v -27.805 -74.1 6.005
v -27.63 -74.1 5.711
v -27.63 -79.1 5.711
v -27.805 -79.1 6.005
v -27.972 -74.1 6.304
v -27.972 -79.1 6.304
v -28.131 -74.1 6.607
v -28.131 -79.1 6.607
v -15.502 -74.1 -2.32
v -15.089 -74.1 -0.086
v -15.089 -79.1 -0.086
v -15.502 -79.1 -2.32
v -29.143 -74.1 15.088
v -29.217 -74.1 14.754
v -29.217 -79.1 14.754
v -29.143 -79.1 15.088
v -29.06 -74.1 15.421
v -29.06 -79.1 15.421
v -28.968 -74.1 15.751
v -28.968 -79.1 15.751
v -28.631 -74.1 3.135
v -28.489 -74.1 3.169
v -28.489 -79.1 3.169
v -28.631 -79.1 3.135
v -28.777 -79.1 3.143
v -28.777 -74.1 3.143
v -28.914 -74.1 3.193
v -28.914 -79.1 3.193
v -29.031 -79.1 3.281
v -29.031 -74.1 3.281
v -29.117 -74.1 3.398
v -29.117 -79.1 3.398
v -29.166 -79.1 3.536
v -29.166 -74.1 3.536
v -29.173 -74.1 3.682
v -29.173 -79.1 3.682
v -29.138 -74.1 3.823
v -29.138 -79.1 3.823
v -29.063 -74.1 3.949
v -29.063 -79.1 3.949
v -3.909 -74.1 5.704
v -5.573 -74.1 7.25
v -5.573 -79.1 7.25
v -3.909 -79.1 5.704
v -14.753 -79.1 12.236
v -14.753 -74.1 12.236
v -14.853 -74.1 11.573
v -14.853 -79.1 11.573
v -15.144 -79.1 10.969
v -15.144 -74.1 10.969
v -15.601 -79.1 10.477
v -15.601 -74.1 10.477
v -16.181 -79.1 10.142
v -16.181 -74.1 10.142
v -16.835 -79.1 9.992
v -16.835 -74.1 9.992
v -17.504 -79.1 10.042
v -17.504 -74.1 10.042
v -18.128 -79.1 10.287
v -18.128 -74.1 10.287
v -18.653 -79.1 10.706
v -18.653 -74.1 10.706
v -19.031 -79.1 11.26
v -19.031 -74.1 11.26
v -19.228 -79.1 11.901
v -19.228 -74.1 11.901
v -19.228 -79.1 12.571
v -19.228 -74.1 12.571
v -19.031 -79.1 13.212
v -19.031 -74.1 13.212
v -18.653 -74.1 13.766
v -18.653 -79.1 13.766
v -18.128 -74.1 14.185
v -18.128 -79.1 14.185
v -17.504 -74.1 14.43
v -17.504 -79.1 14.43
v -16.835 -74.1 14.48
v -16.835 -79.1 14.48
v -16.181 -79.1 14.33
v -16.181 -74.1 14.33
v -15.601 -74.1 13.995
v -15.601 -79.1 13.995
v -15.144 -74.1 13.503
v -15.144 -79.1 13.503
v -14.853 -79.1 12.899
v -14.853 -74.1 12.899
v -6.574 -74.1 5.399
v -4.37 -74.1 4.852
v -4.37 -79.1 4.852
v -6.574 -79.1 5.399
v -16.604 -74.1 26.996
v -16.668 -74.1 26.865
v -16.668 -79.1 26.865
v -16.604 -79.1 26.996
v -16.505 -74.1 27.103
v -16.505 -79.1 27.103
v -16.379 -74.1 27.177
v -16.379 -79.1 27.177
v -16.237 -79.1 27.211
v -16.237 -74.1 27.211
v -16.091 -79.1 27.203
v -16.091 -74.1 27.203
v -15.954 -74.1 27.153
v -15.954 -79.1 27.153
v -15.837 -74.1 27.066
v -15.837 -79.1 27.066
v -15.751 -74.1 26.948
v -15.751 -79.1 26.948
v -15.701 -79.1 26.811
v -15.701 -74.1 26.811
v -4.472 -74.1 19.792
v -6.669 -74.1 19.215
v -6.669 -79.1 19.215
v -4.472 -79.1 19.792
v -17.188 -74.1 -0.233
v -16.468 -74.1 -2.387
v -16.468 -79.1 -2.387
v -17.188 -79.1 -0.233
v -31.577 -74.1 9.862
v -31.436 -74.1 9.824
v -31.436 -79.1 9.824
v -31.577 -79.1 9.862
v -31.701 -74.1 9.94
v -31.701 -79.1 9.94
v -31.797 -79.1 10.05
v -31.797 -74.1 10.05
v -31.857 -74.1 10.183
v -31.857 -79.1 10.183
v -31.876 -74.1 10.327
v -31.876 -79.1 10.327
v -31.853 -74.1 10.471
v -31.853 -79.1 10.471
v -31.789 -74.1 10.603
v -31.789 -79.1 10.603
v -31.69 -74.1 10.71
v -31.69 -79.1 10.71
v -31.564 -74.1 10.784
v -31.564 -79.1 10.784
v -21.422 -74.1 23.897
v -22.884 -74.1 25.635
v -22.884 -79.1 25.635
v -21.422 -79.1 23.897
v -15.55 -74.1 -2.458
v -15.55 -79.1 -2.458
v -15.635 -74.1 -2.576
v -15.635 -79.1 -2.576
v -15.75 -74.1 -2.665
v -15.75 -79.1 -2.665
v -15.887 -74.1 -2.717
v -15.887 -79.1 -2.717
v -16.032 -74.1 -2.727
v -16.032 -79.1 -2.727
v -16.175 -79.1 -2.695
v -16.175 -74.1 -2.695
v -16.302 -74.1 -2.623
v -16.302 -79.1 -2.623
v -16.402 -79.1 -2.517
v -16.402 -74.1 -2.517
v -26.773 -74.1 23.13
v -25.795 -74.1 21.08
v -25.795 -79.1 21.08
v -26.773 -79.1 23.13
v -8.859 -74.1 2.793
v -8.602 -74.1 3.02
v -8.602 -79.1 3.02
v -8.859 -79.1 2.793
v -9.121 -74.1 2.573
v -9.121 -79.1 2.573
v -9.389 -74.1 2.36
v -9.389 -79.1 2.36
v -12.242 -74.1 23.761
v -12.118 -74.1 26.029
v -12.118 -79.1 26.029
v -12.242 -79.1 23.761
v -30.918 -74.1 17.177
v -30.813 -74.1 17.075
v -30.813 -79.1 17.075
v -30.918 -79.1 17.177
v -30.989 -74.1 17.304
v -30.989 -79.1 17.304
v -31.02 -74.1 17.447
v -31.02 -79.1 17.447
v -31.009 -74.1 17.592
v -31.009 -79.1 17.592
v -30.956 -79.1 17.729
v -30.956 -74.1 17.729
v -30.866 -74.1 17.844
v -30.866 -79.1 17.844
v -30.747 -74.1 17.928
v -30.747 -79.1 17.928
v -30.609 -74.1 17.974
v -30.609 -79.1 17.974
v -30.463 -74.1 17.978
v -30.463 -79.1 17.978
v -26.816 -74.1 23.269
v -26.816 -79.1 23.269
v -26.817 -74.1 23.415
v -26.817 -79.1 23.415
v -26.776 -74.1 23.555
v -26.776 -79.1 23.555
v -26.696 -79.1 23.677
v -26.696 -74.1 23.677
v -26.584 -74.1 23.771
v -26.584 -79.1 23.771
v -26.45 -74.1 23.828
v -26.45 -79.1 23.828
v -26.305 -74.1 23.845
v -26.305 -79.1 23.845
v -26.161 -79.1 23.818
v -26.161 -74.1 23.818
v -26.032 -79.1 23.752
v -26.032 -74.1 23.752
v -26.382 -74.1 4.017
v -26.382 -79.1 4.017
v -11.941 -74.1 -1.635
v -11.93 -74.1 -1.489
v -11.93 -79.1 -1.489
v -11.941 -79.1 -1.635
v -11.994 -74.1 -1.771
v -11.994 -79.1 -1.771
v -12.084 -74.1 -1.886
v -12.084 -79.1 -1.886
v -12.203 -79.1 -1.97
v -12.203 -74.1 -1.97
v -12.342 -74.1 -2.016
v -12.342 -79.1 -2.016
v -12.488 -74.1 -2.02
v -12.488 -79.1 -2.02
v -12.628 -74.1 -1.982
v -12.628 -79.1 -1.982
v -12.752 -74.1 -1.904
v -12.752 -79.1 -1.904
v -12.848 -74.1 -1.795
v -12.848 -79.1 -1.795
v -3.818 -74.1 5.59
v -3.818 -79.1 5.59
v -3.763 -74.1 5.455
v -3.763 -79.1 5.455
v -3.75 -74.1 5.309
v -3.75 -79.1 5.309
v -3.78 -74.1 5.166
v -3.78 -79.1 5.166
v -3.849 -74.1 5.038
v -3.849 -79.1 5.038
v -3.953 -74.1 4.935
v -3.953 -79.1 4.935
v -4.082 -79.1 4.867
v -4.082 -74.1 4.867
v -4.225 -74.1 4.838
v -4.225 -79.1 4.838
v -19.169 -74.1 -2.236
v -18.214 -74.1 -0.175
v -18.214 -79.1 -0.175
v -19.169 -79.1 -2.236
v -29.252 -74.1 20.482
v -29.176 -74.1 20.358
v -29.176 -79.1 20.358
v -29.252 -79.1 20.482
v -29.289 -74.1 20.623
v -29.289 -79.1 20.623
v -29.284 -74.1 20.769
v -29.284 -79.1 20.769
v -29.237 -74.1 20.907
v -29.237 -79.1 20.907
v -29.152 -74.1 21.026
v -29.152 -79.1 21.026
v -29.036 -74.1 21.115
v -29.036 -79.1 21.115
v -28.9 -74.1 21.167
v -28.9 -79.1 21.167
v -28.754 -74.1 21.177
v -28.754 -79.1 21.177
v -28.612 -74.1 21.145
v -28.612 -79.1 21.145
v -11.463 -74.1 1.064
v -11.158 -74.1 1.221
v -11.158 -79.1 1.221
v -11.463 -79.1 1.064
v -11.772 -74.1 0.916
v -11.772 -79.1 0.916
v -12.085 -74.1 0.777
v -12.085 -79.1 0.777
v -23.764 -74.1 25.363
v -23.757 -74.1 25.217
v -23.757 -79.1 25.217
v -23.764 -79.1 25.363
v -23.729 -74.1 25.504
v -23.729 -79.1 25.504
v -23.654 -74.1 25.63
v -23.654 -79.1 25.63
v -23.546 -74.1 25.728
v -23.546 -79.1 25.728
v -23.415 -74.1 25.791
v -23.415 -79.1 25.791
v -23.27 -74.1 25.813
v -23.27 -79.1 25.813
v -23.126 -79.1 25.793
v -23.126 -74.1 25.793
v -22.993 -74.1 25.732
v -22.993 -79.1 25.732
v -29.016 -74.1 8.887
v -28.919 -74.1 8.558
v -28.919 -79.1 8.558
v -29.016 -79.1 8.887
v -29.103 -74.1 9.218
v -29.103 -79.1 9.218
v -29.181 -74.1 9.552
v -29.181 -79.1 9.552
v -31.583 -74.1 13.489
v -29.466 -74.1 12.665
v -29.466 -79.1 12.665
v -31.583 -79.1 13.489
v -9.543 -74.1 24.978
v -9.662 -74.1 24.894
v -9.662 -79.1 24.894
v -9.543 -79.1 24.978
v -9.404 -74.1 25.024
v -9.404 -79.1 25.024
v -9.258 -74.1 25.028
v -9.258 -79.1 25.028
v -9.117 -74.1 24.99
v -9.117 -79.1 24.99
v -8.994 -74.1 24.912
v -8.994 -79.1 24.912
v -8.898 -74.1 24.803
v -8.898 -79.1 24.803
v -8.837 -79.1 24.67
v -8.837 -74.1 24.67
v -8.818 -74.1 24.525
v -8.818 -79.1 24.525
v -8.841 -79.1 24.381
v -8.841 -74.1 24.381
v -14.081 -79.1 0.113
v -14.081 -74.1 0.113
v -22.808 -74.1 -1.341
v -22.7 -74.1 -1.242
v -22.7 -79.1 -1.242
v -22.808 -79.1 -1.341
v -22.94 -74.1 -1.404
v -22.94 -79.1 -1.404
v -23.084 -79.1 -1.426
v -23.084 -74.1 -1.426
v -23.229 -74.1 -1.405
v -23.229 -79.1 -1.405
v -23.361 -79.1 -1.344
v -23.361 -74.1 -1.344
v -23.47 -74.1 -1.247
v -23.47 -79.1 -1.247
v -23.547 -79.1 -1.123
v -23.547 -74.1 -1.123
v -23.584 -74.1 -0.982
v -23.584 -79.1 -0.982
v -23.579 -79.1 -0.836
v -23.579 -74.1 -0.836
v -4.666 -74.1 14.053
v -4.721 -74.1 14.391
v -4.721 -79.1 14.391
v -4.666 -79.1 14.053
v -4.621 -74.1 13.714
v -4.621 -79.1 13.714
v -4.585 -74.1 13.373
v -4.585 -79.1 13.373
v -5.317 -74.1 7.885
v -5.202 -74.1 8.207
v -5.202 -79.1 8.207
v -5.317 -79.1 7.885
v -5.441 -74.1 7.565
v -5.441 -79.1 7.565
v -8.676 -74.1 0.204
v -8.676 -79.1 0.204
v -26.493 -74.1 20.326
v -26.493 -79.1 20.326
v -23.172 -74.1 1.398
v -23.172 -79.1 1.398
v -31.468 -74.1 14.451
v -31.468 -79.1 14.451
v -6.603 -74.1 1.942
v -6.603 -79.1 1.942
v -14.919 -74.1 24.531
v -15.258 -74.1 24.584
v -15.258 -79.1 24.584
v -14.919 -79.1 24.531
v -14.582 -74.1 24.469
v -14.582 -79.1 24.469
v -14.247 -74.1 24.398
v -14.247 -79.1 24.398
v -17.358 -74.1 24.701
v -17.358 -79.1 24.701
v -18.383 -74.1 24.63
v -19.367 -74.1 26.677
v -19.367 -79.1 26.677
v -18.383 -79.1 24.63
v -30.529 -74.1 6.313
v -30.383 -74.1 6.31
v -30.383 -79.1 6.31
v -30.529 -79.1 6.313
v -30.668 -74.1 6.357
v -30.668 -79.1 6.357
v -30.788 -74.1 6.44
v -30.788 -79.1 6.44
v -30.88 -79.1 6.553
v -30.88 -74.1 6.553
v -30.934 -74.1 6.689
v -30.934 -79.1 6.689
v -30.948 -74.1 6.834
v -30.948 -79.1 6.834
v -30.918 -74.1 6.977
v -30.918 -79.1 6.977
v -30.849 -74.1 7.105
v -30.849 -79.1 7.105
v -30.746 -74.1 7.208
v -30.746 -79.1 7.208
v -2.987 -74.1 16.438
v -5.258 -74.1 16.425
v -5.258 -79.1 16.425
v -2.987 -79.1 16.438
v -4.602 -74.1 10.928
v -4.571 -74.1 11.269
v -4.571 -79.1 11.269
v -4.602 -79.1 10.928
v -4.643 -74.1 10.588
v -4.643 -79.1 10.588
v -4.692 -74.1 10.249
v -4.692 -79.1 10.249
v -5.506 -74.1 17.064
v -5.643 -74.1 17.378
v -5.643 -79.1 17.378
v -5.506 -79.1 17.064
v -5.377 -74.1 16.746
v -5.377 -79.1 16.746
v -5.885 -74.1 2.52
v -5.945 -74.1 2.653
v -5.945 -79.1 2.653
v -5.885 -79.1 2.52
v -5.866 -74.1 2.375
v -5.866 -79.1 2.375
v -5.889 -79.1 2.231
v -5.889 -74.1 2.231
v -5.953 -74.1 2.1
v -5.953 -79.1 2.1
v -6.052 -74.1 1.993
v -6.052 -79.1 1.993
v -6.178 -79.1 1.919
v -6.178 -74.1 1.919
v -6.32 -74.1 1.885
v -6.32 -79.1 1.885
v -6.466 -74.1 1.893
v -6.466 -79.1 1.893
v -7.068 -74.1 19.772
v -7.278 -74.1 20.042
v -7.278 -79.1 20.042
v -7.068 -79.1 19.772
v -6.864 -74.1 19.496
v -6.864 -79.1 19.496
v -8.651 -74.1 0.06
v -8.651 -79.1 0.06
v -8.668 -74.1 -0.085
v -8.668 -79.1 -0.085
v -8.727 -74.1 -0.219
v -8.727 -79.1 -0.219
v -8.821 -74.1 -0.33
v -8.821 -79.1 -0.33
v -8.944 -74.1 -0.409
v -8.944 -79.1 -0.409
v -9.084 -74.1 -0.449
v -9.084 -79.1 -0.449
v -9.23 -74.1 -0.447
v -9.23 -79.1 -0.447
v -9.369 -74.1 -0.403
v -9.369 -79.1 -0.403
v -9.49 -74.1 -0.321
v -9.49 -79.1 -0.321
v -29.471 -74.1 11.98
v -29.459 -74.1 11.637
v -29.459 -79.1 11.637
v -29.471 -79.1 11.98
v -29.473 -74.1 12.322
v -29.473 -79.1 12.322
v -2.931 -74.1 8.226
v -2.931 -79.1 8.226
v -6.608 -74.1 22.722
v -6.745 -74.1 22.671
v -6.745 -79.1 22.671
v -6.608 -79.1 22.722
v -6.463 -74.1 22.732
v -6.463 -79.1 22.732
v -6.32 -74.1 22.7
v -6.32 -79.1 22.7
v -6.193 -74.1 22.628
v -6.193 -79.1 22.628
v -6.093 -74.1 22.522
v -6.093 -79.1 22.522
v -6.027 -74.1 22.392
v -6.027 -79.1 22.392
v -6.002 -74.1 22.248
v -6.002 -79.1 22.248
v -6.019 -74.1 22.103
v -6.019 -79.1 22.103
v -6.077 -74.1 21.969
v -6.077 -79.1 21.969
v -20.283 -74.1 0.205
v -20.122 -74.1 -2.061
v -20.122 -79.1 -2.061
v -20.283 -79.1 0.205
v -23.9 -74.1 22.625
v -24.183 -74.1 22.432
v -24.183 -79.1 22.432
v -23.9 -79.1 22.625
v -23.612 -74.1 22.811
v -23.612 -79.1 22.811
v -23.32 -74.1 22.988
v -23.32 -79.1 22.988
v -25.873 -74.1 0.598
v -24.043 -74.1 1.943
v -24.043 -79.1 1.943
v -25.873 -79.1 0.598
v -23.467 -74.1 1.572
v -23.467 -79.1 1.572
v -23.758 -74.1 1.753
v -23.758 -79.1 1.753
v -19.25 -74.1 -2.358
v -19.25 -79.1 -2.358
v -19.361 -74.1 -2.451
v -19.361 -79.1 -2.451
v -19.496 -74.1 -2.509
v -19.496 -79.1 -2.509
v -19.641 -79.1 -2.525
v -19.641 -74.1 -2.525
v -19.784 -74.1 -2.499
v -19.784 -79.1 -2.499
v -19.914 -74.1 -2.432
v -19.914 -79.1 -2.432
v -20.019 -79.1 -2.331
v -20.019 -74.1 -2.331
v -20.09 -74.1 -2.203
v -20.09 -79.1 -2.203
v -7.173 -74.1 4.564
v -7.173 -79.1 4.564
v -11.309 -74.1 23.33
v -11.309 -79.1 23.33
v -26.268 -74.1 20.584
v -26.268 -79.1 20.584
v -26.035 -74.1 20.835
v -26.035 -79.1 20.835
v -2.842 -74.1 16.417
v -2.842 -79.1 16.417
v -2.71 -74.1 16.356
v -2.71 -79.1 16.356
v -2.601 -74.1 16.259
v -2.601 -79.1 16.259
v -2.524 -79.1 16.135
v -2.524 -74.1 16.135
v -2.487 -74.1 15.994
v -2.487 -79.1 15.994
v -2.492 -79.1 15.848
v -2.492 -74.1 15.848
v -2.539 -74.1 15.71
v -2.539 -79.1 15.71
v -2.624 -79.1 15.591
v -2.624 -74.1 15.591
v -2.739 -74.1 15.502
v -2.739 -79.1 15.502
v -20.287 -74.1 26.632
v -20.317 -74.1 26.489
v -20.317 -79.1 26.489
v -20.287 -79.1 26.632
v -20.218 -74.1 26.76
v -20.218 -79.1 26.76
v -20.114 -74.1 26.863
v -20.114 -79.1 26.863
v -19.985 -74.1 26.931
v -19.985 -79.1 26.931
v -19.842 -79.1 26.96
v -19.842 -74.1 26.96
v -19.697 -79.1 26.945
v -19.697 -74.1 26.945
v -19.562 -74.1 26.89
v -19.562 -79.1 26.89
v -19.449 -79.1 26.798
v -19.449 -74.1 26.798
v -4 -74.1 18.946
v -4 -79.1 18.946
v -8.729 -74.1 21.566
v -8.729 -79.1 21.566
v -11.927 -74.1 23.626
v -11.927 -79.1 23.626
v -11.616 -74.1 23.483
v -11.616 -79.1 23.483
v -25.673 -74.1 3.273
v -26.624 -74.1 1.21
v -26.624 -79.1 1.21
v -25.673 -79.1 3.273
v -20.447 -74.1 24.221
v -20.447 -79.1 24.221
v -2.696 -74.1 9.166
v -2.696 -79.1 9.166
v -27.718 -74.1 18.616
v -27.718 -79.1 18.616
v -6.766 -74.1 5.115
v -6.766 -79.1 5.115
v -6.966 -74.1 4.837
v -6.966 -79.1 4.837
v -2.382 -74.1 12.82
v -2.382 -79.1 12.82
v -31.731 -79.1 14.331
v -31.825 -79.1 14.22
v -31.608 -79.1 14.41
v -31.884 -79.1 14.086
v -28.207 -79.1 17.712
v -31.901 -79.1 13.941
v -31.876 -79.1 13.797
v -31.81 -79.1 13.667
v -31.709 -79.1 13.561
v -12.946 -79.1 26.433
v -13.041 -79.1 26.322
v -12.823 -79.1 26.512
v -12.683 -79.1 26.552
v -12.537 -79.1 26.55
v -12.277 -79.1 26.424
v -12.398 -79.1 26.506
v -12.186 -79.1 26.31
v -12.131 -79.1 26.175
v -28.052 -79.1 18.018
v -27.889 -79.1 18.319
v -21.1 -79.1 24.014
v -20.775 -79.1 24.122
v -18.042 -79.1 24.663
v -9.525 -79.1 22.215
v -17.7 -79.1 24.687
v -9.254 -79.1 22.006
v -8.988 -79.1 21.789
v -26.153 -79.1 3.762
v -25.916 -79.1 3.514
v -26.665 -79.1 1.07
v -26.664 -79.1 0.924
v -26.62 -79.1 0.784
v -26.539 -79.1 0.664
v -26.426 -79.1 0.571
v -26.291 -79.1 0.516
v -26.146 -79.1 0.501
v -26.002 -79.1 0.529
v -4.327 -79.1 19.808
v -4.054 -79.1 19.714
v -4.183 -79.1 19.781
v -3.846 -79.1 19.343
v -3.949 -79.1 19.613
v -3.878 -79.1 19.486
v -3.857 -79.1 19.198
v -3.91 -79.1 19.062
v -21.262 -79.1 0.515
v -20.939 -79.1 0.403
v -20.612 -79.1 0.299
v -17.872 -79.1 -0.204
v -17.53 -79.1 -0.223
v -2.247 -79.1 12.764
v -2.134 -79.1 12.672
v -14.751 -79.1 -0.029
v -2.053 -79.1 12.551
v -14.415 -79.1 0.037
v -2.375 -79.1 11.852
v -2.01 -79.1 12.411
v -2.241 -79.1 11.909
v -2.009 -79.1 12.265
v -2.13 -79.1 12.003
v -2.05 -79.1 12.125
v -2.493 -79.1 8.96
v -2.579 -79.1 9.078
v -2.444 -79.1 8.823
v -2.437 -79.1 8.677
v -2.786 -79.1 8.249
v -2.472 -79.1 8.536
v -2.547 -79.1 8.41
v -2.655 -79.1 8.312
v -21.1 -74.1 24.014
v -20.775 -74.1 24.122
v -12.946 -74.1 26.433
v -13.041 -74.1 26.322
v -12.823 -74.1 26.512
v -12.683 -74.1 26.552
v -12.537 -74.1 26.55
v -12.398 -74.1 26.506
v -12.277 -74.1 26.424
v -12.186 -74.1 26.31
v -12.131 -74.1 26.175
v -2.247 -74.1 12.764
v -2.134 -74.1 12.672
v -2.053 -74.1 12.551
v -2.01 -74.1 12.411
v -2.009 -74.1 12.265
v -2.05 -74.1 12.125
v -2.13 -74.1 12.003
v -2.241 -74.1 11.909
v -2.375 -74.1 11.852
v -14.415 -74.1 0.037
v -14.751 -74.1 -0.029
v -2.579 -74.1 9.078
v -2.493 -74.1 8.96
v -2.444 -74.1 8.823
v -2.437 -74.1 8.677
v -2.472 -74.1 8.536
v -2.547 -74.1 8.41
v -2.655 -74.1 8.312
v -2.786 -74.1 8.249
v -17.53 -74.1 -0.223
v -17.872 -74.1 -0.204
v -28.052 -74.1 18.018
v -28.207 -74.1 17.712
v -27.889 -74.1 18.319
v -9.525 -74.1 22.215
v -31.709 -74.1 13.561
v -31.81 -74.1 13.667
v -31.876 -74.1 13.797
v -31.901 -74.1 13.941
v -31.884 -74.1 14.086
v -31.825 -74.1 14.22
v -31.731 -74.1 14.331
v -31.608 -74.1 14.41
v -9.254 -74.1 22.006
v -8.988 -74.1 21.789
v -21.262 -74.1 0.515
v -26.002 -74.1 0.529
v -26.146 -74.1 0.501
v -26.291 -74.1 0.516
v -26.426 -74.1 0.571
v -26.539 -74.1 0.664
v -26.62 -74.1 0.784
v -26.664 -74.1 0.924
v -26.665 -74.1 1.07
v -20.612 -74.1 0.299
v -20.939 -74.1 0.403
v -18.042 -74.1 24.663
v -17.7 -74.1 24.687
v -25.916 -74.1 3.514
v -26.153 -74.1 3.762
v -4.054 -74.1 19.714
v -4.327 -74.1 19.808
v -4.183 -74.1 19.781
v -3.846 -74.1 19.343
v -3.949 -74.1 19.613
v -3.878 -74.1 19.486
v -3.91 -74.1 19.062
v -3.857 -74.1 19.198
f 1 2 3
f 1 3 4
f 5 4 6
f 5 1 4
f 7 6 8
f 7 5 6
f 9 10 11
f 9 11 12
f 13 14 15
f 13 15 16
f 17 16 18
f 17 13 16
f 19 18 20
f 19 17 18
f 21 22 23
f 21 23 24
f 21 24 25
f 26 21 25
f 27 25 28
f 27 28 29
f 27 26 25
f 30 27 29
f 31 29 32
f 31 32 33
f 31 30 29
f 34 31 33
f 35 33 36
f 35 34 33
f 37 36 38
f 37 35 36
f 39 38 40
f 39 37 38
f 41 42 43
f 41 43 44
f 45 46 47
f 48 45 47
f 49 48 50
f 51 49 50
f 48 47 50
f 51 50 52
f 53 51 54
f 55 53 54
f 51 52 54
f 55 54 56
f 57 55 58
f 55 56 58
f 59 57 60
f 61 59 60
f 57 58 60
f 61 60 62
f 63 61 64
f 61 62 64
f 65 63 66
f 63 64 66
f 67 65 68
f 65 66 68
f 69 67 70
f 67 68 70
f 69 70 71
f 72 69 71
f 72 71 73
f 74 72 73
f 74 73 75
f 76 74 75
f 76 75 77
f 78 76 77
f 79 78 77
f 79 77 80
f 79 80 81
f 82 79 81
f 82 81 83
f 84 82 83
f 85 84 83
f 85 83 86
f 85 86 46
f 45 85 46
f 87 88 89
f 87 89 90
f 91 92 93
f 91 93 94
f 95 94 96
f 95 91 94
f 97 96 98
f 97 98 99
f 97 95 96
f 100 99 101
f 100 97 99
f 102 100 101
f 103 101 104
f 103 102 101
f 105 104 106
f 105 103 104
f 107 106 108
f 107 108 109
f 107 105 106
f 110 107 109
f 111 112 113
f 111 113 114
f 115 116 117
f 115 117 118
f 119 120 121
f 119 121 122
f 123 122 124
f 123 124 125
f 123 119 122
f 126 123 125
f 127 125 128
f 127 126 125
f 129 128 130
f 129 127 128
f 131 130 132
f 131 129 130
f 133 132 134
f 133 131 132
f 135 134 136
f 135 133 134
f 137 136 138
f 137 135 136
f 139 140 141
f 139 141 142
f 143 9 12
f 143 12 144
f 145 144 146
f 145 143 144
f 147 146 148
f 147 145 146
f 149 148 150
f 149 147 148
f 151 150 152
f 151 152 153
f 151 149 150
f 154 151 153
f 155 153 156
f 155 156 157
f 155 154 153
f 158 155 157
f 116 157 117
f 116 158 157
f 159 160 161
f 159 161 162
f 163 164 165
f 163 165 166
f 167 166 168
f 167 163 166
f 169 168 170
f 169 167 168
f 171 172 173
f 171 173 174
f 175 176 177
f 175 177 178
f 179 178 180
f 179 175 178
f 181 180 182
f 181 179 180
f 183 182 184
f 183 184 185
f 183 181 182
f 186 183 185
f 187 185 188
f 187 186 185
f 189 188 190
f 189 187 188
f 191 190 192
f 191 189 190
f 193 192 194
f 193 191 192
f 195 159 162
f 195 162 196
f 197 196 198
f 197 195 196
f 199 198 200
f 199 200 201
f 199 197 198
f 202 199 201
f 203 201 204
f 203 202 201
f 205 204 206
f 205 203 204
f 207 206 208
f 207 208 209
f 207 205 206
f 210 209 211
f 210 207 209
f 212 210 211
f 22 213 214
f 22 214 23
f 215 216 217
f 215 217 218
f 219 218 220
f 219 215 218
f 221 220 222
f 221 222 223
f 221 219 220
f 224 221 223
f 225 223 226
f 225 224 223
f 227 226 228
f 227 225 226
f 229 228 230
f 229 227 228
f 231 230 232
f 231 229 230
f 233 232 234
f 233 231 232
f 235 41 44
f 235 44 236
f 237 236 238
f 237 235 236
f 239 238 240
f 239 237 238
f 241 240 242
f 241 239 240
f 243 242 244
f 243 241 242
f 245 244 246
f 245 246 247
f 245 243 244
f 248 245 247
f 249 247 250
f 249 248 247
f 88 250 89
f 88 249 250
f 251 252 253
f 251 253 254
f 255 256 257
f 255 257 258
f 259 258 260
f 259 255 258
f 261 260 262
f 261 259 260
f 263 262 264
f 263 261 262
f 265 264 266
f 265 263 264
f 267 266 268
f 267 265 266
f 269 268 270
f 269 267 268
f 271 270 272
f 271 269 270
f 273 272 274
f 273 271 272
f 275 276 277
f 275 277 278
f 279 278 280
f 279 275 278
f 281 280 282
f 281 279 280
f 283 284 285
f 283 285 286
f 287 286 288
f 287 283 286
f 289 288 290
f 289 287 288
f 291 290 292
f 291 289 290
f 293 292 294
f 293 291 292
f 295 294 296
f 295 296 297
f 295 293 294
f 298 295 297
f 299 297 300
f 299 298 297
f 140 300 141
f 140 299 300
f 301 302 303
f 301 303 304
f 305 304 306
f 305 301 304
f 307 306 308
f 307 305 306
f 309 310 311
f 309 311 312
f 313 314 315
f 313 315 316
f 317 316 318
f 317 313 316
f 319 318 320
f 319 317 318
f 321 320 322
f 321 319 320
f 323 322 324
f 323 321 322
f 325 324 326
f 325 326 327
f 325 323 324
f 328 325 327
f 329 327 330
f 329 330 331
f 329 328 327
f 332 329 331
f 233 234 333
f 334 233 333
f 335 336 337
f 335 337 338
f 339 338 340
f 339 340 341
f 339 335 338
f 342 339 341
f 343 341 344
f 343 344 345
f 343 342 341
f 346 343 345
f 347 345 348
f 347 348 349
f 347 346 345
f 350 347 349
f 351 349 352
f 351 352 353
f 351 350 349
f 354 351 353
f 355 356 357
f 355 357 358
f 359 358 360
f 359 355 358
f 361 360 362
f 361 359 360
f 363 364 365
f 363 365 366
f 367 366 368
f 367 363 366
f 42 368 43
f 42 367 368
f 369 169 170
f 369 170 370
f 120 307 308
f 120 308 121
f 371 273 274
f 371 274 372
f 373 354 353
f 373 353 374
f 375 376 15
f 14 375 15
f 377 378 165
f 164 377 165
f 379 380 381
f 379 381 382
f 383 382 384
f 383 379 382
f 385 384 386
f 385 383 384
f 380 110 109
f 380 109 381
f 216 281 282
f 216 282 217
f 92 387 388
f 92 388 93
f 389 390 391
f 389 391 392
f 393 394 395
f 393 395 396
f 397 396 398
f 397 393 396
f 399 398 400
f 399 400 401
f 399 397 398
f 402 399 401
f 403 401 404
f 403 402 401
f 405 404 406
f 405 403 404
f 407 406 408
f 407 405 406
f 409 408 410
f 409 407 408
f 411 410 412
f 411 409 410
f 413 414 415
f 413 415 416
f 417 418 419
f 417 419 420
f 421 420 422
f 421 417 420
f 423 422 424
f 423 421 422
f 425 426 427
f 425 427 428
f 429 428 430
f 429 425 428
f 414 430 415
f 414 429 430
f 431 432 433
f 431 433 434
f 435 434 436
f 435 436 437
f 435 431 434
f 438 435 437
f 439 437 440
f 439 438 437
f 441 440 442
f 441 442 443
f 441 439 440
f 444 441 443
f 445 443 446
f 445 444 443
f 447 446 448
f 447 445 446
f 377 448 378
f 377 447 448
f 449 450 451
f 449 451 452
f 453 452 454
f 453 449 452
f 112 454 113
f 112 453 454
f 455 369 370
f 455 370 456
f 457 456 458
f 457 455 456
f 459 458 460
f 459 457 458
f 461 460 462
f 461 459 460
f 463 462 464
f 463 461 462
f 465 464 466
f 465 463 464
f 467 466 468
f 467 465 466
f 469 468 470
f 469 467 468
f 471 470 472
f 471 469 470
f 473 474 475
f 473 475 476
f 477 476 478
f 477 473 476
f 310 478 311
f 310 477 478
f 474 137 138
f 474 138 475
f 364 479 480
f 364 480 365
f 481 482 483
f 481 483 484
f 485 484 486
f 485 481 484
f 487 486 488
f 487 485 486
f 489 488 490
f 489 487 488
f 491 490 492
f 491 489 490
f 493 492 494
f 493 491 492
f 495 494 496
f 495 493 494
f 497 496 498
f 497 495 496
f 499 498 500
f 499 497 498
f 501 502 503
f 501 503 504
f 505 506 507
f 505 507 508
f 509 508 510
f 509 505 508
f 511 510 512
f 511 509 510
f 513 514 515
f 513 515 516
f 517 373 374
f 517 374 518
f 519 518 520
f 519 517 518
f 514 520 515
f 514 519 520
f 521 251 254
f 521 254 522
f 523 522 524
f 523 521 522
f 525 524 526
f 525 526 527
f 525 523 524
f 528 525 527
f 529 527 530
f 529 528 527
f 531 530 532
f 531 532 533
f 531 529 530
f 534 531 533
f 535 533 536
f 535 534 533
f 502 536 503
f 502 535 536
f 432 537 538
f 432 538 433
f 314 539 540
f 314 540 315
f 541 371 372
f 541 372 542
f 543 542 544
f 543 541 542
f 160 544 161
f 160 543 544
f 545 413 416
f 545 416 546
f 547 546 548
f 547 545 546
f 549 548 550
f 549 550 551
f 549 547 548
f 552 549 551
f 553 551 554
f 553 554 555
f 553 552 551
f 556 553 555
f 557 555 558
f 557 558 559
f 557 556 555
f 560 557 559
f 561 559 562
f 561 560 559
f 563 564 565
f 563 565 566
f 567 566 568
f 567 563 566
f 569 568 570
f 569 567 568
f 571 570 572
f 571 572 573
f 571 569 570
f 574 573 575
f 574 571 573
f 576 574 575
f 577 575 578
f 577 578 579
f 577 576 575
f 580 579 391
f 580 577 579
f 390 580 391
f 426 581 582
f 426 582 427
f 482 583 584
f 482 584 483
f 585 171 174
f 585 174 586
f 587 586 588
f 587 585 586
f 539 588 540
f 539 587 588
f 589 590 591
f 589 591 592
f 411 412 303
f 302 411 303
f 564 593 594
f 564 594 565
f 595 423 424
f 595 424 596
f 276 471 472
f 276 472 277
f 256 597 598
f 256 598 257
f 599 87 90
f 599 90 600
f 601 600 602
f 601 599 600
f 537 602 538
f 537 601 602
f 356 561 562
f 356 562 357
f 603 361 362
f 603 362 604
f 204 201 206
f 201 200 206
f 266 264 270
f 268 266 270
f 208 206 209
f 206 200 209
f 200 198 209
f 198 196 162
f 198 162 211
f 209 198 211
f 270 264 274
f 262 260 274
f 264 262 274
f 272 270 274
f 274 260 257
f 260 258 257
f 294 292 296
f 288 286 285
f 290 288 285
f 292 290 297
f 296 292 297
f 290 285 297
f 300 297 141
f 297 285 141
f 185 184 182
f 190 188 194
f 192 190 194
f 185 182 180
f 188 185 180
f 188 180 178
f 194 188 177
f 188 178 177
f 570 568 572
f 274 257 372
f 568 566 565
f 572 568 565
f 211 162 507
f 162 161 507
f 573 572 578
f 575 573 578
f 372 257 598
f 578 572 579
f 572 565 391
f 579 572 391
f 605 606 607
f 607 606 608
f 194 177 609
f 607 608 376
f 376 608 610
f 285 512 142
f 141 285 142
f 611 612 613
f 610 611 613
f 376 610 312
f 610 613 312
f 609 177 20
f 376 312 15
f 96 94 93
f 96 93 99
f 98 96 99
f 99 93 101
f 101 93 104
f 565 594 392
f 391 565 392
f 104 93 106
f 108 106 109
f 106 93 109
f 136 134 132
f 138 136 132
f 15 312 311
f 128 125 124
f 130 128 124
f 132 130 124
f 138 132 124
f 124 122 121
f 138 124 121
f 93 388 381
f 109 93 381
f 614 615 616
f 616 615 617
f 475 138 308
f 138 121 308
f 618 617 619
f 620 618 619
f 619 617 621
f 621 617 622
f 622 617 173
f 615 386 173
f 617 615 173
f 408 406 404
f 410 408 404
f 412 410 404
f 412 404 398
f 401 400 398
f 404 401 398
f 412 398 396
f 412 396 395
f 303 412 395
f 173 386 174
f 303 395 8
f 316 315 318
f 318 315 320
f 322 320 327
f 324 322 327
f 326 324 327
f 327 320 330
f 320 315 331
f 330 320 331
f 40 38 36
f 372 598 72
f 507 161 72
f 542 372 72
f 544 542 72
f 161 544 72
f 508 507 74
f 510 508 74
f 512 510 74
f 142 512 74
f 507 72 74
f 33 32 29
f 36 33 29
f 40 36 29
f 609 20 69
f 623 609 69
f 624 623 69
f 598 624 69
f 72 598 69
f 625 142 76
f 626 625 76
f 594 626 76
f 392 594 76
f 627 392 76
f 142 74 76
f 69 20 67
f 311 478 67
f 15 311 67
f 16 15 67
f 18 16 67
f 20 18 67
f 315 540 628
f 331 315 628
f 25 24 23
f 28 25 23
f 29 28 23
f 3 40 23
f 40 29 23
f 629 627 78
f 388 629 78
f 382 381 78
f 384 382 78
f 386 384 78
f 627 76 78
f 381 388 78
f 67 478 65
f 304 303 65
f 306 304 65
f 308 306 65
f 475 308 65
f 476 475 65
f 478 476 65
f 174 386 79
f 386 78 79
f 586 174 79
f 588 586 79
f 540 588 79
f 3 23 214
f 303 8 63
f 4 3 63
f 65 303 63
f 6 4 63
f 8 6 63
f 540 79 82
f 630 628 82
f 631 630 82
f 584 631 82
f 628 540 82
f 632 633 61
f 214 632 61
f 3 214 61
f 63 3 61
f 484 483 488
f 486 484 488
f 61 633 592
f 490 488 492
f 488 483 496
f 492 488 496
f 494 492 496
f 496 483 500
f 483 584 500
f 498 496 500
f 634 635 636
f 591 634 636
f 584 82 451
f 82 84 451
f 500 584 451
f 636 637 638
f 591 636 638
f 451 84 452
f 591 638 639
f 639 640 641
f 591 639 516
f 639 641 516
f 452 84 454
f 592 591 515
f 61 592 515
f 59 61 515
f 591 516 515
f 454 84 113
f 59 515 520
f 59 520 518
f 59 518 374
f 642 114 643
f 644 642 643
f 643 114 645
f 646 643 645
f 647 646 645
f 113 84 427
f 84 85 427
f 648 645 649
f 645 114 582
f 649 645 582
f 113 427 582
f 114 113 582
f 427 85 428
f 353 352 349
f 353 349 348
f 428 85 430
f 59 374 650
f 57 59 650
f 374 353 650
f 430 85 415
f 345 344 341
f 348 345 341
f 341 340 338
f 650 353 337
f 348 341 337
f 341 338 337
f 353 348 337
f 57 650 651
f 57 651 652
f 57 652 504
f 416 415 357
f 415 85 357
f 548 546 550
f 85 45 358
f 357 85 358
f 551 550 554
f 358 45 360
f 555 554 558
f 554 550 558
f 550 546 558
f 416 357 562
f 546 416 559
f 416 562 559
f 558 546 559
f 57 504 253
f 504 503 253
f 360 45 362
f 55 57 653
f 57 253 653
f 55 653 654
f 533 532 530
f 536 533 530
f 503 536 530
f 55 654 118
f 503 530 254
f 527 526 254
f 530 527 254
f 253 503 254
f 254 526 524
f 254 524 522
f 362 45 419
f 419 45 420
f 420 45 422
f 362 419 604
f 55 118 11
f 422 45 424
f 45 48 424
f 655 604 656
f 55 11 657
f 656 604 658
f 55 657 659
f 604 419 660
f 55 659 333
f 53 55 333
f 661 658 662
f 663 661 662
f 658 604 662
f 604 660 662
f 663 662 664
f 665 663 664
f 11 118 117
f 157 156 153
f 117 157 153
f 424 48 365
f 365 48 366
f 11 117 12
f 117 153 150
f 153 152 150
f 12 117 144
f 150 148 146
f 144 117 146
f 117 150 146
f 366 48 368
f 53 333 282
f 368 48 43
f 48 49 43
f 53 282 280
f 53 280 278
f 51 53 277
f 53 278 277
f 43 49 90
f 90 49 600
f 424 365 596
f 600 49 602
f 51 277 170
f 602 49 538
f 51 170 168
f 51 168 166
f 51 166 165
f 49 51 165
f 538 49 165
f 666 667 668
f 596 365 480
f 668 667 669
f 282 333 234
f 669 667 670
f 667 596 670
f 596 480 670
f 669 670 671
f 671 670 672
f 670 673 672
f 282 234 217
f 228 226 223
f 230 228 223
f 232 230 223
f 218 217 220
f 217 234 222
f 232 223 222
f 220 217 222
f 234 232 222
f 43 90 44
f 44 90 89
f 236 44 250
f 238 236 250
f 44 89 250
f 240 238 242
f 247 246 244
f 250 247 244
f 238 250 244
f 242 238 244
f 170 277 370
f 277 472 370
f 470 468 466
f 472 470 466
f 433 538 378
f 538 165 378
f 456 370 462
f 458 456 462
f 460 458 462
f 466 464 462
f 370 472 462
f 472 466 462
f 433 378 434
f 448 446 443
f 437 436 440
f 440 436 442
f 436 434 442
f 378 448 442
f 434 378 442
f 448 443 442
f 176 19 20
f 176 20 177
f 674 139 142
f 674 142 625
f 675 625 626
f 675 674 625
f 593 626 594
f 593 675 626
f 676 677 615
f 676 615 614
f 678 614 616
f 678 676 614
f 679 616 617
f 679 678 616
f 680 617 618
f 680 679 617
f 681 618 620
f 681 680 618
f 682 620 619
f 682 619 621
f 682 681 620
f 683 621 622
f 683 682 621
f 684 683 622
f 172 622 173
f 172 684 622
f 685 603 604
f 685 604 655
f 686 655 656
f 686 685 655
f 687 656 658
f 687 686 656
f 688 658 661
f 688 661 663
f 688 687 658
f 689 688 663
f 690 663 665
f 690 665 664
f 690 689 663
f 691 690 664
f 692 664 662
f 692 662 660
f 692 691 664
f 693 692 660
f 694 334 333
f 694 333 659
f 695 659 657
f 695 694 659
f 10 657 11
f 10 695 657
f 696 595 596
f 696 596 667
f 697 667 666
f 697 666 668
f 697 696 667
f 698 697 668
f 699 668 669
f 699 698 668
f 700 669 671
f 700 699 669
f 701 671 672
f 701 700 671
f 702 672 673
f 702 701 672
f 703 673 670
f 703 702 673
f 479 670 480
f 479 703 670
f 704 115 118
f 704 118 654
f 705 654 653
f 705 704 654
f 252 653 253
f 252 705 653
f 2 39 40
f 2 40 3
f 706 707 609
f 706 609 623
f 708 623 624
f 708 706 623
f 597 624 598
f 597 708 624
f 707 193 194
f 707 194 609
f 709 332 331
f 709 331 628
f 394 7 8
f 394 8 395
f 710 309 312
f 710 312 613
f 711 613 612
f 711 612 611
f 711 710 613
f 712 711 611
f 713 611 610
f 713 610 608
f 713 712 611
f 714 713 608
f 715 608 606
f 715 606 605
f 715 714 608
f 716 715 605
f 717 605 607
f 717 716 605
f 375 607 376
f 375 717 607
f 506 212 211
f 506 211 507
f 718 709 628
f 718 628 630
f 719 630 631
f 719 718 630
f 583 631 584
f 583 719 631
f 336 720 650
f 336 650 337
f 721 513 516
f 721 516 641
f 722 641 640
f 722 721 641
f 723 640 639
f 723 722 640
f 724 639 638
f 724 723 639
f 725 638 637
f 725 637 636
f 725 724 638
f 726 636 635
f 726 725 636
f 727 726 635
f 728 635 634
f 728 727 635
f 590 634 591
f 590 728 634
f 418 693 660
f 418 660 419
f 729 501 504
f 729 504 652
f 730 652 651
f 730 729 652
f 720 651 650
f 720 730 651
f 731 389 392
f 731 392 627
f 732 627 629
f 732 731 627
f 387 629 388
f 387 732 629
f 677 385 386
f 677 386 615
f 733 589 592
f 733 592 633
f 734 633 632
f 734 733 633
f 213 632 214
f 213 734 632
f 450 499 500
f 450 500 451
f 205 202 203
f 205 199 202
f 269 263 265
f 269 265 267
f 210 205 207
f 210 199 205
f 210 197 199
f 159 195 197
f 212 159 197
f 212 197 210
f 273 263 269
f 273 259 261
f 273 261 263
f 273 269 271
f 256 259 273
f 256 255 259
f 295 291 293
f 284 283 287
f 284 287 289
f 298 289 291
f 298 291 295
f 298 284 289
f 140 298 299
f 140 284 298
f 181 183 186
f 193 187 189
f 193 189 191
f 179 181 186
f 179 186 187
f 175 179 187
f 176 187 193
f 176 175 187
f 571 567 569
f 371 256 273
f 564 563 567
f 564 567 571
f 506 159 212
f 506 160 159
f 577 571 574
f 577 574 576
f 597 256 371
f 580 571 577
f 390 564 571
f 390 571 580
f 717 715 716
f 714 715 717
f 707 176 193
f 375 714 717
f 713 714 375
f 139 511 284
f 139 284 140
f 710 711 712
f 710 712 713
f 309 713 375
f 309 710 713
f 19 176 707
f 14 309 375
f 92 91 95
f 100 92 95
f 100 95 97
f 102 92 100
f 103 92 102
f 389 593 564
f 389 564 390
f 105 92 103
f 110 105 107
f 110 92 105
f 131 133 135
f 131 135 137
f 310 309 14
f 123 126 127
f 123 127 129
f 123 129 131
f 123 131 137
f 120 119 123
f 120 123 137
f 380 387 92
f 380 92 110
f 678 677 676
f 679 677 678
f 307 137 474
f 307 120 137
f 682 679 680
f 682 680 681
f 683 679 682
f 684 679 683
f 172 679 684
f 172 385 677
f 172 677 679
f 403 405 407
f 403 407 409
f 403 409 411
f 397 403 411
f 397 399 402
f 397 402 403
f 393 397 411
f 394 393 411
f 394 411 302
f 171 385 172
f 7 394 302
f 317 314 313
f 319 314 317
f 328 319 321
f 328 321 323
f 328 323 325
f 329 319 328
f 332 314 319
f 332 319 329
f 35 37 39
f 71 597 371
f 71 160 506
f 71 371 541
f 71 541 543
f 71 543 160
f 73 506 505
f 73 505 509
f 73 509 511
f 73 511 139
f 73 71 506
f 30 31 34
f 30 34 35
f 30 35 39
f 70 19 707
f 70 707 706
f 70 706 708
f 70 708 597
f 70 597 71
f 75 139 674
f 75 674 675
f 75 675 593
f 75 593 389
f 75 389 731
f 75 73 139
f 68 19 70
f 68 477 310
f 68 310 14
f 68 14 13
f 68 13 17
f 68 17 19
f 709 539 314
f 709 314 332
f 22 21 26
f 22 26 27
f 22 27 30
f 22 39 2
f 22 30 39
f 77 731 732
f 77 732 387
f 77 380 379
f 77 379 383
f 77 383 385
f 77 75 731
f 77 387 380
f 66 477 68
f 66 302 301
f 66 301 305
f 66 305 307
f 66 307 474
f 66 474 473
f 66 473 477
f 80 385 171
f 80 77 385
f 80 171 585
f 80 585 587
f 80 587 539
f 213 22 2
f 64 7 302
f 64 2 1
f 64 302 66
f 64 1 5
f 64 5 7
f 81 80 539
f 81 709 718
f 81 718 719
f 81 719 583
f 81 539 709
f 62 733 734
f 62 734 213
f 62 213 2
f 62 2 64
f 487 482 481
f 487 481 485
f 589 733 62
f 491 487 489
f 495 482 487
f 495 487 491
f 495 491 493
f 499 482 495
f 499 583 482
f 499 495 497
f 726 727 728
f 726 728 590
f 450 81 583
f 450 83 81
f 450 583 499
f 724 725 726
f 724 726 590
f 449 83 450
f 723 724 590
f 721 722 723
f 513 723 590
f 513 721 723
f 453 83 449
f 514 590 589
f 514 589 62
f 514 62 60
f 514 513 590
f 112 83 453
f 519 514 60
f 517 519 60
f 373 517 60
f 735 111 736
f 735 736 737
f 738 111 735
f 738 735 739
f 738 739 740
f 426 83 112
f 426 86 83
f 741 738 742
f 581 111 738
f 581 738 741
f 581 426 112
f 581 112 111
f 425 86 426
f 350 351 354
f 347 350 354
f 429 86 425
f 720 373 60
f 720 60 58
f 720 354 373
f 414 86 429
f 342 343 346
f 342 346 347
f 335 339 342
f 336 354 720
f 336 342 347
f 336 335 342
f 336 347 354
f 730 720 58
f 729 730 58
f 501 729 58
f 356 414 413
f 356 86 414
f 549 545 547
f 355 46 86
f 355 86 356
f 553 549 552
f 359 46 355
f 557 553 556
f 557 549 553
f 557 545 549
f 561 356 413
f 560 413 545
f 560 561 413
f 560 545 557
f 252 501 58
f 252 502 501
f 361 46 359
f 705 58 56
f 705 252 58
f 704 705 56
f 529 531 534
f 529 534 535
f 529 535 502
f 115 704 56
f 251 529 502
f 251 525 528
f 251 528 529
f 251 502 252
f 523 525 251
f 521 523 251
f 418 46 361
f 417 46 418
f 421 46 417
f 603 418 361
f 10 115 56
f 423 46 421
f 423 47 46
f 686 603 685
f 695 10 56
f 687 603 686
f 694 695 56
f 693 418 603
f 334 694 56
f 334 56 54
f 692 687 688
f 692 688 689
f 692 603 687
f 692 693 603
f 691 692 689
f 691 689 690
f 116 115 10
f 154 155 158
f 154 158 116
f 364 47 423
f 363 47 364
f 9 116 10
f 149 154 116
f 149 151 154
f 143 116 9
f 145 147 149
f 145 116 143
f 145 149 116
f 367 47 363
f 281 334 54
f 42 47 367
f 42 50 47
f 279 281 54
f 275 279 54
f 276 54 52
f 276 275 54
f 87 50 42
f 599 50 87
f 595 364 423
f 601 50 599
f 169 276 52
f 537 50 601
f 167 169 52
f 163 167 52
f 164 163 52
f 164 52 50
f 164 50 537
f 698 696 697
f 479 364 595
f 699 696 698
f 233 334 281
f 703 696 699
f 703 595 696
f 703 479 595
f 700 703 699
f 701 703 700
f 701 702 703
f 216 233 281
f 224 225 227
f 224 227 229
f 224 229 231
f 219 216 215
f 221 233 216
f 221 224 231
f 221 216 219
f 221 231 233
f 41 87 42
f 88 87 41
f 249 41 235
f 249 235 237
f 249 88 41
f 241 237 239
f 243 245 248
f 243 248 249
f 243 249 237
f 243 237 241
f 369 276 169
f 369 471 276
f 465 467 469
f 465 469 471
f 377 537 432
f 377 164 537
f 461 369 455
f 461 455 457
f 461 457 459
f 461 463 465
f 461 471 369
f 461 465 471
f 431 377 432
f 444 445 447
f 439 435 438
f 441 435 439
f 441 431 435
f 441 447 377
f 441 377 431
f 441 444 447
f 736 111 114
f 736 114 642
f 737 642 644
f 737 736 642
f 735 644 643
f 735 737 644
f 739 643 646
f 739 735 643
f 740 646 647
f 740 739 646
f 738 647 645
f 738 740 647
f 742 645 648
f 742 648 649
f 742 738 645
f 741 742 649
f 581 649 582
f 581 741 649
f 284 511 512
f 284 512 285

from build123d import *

# Parameters (mm, degrees)
BOSS_EXTRUDE1_DEPTH = 5
SKETCH6_R           = 2.25
CUT_EXTRUDE1_DEPTH  = 6


with BuildPart() as part:
    # Sketch1 → Boss-Extrude1 (new body)
    with BuildSketch(Plane(origin=(0, -74.1, 0), x_dir=(1, 0, 0), z_dir=(0, 1, 0))):
        with BuildLine():
            Line((-5.573417888, -7.249599077), (-3.909244984, -5.703911435))
            ThreePointArc((-3.909244984, -5.703911435), (-3.809726926, -5.099679562), (-4.369892407, -4.852263649))
            Line((-4.369892407, -4.852263649), (-6.574346511, -5.399076092))
            ThreePointArc((-6.574346511, -5.399076092), (-6.86485582, -4.975241994), (-7.172578897, -4.563735604))
            Line((-7.172578897, -4.563735604), (-5.94508593, -2.65274561))
            ThreePointArc((-5.94508593, -2.65274561), (-5.998960771, -2.042747658), (-6.603057459, -1.942412262))
            Line((-6.603057459, -1.942412262), (-8.602267858, -3.020271029))
            ThreePointArc((-8.602267858, -3.020271029), (-8.989053537, -2.681999186), (-9.389446406, -2.359948643))
            Line((-9.389446406, -2.359948643), (-8.675761274, -0.203730826))
            ThreePointArc((-8.675761274, -0.203730826), (-8.87964386, 0.37370479), (-9.489714138, 0.320655229))
            Line((-9.489714138, 0.320655229), (-11.158063091, -1.220524032))
            ThreePointArc((-11.158063091, -1.220524032), (-11.616821973, -0.989069307), (-12.084726477, -0.776710232))
            Line((-12.084726477, -0.776710232), (-11.92969264, 1.489252312))
            ThreePointArc((-11.92969264, 1.489252312), (-12.270772279, 1.997843189), (-12.848483188, 1.794741969))
            Line((-12.848483188, 1.794741969), (-14.081142194, -0.112919824))
            ThreePointArc((-14.081142194, -0.112919824), (-14.583048772, -0.00282537), (-15.089064749, 0.086498936))
            Line((-15.089064749, 0.086498936), (-15.502423555, 2.319827447))
            ThreePointArc((-15.502423555, 2.319827447), (-15.959268957, 2.72761695), (-16.468320796, 2.387225667))
            Line((-16.468320796, 2.387225667), (-17.187837357, 0.232946748))
            ThreePointArc((-17.187837357, 0.232946748), (-17.701354994, 0.214763292), (-18.213687601, 0.175440255))
            Line((-18.213687601, 0.175440255), (-19.169466196, 2.235806489))
            ThreePointArc((-19.169466196, 2.235806489), (-19.713372085, 2.517171704), (-20.121779254, 2.060878394))
            Line((-20.121779254, 2.060878394), (-20.282943498, -0.204656383))
            ThreePointArc((-20.282943498, -0.204656383), (-20.775805993, -0.349975216), (-21.262263487, -0.515474786))
            Line((-21.262263487, -0.515474786), (-22.700406786, 1.242468784))
            ThreePointArc((-22.700406786, 1.242468784), (-23.297197554, 1.379730498), (-23.57929833, 0.83620575))
            Line((-23.57929833, 0.83620575), (-23.171983715, -1.398233005))
            ThreePointArc((-23.171983715, -1.398233005), (-23.613222703, -1.661556297), (-24.043239171, -1.942833453))
            Line((-24.043239171, -1.942833453), (-25.873383342, -0.597770608))
            ThreePointArc((-25.873383342, -0.597770608), (-26.485560432, -0.613237052), (-26.623629384, -1.209841581))
            Line((-26.623629384, -1.209841581), (-25.673428985, -3.272786307))
            ThreePointArc((-25.673428985, -3.272786307), (-26.0353198, -3.637568488), (-26.381875725, -4.016949552))
            Line((-26.381875725, -4.016949552), (-28.489026078, -3.169282677))
            ThreePointArc((-28.489026078, -3.169282677), (-29.078124151, -3.336505465), (-29.063485901, -3.948702919))
            Line((-29.063485901, -3.948702919), (-27.630104303, -5.710531213))
            ThreePointArc((-27.630104303, -5.710531213), (-27.889908013, -6.153851676), (-28.131228013, -6.607498741))
            Line((-28.131228013, -6.607498741), (-30.382984542, -6.310489863))
            ThreePointArc((-30.382984542, -6.310489863), (-30.911988399, -6.618961773), (-30.745562721, -7.208285533))
            Line((-30.745562721, -7.208285533), (-28.919064562, -8.558295243))
            ThreePointArc((-28.919064562, -8.558295243), (-29.060456745, -9.052298535), (-29.181377796, -9.551707286))
            Line((-29.181377796, -9.551707286), (-31.436254358, -9.824018565))
            ThreePointArc((-31.436254358, -9.824018565), (-31.871924741, -10.254357173), (-31.564168772, -10.783777859))
            Line((-31.564168772, -10.783777859), (-29.459319649, -11.637142911))
            ThreePointArc((-29.459319649, -11.637142911), (-29.473416113, -12.150788987), (-29.466340301, -12.664579737))
            Line((-29.466340301, -12.664579737), (-31.582654708, -13.489100854))
            ThreePointArc((-31.582654708, -13.489100854), (-31.897616846, -14.014266401), (-31.467868026, -14.450518566))
            Line((-31.467868026, -14.450518566), (-29.21692335, -14.753618895))
            ThreePointArc((-29.21692335, -14.753618895), (-29.102838363, -15.254633483), (-28.968210287, -15.750522868))
            Line((-28.968210287, -15.750522868), (-30.812986722, -17.07544613))
            ThreePointArc((-30.812986722, -17.07544613), (-30.987450384, -17.662440534), (-30.462711412, -17.97811285))
            Line((-30.462711412, -17.97811285), (-28.207106316, -17.711903547))
            ThreePointArc((-28.207106316, -17.711903547), (-27.972008257, -18.168806058), (-27.718287094, -18.615635525))
            Line((-27.718287094, -18.615635525), (-29.175611469, -20.357711129))
            ThreePointArc((-29.175611469, -20.357711129), (-29.198614462, -20.969651374), (-28.611856617, -21.144908987))
            Line((-28.611856617, -21.144908987), (-26.493319064, -20.326116962))
            ThreePointArc((-26.493319064, -20.326116962), (-26.151980009, -20.710198531), (-25.795107994, -21.079892141))
            Line((-25.795107994, -21.079892141), (-26.773411257, -23.129659071))
            ThreePointArc((-26.773411257, -23.129659071), (-26.643508219, -23.728094699), (-26.031599654, -23.75192553))
            Line((-26.031599654, -23.75192553), (-24.183245151, -22.431998497))
            ThreePointArc((-24.183245151, -22.431998497), (-23.757112689, -22.719125866), (-23.319513401, -22.988454411))
            Line((-23.319513401, -22.988454411), (-23.757325162, -25.217118272))
            ThreePointArc((-23.757325162, -25.217118272), (-23.482678378, -25.764447372), (-22.88406756, -25.635354042))
            Line((-22.88406756, -25.635354042), (-21.422035016, -23.897227871))
            ThreePointArc((-21.422035016, -23.897227871), (-20.937884616, -24.069359772), (-20.44705403, -24.221400348))
            Line((-20.44705403, -24.221400348), (-20.316864965, -26.488925992))
            ThreePointArc((-20.316864965, -26.488925992), (-19.914731502, -26.950757865), (-19.367031349, -26.676851782))
            Line((-19.367031349, -26.676851782), (-18.383185648, -24.629739333))
            ThreePointArc((-18.383185648, -24.629739333), (-17.87143826, -24.676060085), (-17.358217065, -24.701259423))
            Line((-17.358217065, -24.701259423), (-16.668207433, -26.865169876))
            ThreePointArc((-16.668207433, -26.865169876), (-16.163854816, -27.212485926), (-15.701479344, -26.810977617))
            Line((-15.701479344, -26.810977617), (-15.257639128, -24.583506493))
            ThreePointArc((-15.257639128, -24.583506493), (-14.750449723, -24.501105593), (-14.247085495, -24.397880327))
            Line((-14.247085495, -24.397880327), (-13.040611138, -26.322209137))
            ThreePointArc((-13.040611138, -26.322209137), (-12.465729697, -26.533186219), (-12.117731656, -26.029303927))
            Line((-12.117731656, -26.029303927), (-12.241785039, -23.761434332))
            ThreePointArc((-12.241785039, -23.761434332), (-11.771022192, -23.555489332), (-11.309143157, -23.330325485))
            Line((-11.309143157, -23.330325485), (-9.662011296, -24.894159994))
            ThreePointArc((-9.662011296, -24.894159994), (-9.052722946, -24.955541642), (-8.840968333, -24.380946146))
            Line((-8.840968333, -24.380946146), (-9.525120585, -22.215176667))
            ThreePointArc((-9.525120585, -22.215176667), (-9.120364058, -21.898627848), (-8.728991773, -21.565673292))
            Line((-8.728991773, -21.565673292), (-6.744697761, -22.670752028))
            ThreePointArc((-6.744697761, -22.670752028), (-6.139286329, -22.578681408), (-6.077080467, -21.969476655))
            Line((-6.077080467, -21.969476655), (-7.278343785, -20.041890553))
            ThreePointArc((-7.278343785, -20.041890553), (-6.965025918, -19.634627842), (-6.668751745, -19.214803336))
            Line((-6.668751745, -19.214803336), (-4.471976071, -19.791690138))
            ThreePointArc((-4.471976071, -19.791690138), (-3.908481786, -19.551952385), (-3.999733295, -18.94641695))
            Line((-3.999733295, -18.94641695), (-5.642627888, -17.378131549))
            ThreePointArc((-5.642627888, -17.378131549), (-5.440435595, -16.905744761), (-5.257875529, -16.425429423))
            Line((-5.257875529, -16.425429423), (-2.986649689, -16.43787637))
            ThreePointArc((-2.986649689, -16.43787637), (-2.500478968, -16.065535089), (-2.739454182, -15.501716992))
            Line((-2.739454182, -15.501716992), (-4.72075094, -14.391273432))
            ThreePointArc((-4.72075094, -14.391273432), (-4.642388707, -13.883444364), (-4.585013668, -13.372818174))
            Line((-4.585013668, -13.372818174), (-2.382047135, -12.820043179))
            ThreePointArc((-2.382047135, -12.820043179), (-2.003747871, -12.338493942), (-2.375431099, -11.851819947))
            Line((-2.375431099, -11.851819947), (-4.570637859, -11.26899148))
            ThreePointArc((-4.570637859, -11.26899148), (-4.621029474, -10.757628901), (-4.692444547, -10.24877638))
            Line((-4.692444547, -10.24877638), (-2.696157809, -9.16551233))
            ThreePointArc((-2.696157809, -9.16551233), (-2.449499938, -8.605012646), (-2.930536955, -8.226062269))
            Line((-2.930536955, -8.226062269), (-5.201720804, -8.207470152))
            ThreePointArc((-5.201720804, -8.207470152), (-5.377699975, -7.724704854), (-5.573417888, -7.249599077))
        make_face()
    extrude(amount=-BOSS_EXTRUDE1_DEPTH)

    # Sketch6 → Cut-Extrude1 (cut, through all)
    with BuildSketch(Plane(origin=(0, -74.1, 0), x_dir=(1, 0, 0), z_dir=(0, 1, 0))):
        with Locations((-17.003397692, -12.235998762)):
            Circle(SKETCH6_R)
    extrude(amount=-CUT_EXTRUDE1_DEPTH, mode=Mode.SUBTRACT)


solid = part.part
